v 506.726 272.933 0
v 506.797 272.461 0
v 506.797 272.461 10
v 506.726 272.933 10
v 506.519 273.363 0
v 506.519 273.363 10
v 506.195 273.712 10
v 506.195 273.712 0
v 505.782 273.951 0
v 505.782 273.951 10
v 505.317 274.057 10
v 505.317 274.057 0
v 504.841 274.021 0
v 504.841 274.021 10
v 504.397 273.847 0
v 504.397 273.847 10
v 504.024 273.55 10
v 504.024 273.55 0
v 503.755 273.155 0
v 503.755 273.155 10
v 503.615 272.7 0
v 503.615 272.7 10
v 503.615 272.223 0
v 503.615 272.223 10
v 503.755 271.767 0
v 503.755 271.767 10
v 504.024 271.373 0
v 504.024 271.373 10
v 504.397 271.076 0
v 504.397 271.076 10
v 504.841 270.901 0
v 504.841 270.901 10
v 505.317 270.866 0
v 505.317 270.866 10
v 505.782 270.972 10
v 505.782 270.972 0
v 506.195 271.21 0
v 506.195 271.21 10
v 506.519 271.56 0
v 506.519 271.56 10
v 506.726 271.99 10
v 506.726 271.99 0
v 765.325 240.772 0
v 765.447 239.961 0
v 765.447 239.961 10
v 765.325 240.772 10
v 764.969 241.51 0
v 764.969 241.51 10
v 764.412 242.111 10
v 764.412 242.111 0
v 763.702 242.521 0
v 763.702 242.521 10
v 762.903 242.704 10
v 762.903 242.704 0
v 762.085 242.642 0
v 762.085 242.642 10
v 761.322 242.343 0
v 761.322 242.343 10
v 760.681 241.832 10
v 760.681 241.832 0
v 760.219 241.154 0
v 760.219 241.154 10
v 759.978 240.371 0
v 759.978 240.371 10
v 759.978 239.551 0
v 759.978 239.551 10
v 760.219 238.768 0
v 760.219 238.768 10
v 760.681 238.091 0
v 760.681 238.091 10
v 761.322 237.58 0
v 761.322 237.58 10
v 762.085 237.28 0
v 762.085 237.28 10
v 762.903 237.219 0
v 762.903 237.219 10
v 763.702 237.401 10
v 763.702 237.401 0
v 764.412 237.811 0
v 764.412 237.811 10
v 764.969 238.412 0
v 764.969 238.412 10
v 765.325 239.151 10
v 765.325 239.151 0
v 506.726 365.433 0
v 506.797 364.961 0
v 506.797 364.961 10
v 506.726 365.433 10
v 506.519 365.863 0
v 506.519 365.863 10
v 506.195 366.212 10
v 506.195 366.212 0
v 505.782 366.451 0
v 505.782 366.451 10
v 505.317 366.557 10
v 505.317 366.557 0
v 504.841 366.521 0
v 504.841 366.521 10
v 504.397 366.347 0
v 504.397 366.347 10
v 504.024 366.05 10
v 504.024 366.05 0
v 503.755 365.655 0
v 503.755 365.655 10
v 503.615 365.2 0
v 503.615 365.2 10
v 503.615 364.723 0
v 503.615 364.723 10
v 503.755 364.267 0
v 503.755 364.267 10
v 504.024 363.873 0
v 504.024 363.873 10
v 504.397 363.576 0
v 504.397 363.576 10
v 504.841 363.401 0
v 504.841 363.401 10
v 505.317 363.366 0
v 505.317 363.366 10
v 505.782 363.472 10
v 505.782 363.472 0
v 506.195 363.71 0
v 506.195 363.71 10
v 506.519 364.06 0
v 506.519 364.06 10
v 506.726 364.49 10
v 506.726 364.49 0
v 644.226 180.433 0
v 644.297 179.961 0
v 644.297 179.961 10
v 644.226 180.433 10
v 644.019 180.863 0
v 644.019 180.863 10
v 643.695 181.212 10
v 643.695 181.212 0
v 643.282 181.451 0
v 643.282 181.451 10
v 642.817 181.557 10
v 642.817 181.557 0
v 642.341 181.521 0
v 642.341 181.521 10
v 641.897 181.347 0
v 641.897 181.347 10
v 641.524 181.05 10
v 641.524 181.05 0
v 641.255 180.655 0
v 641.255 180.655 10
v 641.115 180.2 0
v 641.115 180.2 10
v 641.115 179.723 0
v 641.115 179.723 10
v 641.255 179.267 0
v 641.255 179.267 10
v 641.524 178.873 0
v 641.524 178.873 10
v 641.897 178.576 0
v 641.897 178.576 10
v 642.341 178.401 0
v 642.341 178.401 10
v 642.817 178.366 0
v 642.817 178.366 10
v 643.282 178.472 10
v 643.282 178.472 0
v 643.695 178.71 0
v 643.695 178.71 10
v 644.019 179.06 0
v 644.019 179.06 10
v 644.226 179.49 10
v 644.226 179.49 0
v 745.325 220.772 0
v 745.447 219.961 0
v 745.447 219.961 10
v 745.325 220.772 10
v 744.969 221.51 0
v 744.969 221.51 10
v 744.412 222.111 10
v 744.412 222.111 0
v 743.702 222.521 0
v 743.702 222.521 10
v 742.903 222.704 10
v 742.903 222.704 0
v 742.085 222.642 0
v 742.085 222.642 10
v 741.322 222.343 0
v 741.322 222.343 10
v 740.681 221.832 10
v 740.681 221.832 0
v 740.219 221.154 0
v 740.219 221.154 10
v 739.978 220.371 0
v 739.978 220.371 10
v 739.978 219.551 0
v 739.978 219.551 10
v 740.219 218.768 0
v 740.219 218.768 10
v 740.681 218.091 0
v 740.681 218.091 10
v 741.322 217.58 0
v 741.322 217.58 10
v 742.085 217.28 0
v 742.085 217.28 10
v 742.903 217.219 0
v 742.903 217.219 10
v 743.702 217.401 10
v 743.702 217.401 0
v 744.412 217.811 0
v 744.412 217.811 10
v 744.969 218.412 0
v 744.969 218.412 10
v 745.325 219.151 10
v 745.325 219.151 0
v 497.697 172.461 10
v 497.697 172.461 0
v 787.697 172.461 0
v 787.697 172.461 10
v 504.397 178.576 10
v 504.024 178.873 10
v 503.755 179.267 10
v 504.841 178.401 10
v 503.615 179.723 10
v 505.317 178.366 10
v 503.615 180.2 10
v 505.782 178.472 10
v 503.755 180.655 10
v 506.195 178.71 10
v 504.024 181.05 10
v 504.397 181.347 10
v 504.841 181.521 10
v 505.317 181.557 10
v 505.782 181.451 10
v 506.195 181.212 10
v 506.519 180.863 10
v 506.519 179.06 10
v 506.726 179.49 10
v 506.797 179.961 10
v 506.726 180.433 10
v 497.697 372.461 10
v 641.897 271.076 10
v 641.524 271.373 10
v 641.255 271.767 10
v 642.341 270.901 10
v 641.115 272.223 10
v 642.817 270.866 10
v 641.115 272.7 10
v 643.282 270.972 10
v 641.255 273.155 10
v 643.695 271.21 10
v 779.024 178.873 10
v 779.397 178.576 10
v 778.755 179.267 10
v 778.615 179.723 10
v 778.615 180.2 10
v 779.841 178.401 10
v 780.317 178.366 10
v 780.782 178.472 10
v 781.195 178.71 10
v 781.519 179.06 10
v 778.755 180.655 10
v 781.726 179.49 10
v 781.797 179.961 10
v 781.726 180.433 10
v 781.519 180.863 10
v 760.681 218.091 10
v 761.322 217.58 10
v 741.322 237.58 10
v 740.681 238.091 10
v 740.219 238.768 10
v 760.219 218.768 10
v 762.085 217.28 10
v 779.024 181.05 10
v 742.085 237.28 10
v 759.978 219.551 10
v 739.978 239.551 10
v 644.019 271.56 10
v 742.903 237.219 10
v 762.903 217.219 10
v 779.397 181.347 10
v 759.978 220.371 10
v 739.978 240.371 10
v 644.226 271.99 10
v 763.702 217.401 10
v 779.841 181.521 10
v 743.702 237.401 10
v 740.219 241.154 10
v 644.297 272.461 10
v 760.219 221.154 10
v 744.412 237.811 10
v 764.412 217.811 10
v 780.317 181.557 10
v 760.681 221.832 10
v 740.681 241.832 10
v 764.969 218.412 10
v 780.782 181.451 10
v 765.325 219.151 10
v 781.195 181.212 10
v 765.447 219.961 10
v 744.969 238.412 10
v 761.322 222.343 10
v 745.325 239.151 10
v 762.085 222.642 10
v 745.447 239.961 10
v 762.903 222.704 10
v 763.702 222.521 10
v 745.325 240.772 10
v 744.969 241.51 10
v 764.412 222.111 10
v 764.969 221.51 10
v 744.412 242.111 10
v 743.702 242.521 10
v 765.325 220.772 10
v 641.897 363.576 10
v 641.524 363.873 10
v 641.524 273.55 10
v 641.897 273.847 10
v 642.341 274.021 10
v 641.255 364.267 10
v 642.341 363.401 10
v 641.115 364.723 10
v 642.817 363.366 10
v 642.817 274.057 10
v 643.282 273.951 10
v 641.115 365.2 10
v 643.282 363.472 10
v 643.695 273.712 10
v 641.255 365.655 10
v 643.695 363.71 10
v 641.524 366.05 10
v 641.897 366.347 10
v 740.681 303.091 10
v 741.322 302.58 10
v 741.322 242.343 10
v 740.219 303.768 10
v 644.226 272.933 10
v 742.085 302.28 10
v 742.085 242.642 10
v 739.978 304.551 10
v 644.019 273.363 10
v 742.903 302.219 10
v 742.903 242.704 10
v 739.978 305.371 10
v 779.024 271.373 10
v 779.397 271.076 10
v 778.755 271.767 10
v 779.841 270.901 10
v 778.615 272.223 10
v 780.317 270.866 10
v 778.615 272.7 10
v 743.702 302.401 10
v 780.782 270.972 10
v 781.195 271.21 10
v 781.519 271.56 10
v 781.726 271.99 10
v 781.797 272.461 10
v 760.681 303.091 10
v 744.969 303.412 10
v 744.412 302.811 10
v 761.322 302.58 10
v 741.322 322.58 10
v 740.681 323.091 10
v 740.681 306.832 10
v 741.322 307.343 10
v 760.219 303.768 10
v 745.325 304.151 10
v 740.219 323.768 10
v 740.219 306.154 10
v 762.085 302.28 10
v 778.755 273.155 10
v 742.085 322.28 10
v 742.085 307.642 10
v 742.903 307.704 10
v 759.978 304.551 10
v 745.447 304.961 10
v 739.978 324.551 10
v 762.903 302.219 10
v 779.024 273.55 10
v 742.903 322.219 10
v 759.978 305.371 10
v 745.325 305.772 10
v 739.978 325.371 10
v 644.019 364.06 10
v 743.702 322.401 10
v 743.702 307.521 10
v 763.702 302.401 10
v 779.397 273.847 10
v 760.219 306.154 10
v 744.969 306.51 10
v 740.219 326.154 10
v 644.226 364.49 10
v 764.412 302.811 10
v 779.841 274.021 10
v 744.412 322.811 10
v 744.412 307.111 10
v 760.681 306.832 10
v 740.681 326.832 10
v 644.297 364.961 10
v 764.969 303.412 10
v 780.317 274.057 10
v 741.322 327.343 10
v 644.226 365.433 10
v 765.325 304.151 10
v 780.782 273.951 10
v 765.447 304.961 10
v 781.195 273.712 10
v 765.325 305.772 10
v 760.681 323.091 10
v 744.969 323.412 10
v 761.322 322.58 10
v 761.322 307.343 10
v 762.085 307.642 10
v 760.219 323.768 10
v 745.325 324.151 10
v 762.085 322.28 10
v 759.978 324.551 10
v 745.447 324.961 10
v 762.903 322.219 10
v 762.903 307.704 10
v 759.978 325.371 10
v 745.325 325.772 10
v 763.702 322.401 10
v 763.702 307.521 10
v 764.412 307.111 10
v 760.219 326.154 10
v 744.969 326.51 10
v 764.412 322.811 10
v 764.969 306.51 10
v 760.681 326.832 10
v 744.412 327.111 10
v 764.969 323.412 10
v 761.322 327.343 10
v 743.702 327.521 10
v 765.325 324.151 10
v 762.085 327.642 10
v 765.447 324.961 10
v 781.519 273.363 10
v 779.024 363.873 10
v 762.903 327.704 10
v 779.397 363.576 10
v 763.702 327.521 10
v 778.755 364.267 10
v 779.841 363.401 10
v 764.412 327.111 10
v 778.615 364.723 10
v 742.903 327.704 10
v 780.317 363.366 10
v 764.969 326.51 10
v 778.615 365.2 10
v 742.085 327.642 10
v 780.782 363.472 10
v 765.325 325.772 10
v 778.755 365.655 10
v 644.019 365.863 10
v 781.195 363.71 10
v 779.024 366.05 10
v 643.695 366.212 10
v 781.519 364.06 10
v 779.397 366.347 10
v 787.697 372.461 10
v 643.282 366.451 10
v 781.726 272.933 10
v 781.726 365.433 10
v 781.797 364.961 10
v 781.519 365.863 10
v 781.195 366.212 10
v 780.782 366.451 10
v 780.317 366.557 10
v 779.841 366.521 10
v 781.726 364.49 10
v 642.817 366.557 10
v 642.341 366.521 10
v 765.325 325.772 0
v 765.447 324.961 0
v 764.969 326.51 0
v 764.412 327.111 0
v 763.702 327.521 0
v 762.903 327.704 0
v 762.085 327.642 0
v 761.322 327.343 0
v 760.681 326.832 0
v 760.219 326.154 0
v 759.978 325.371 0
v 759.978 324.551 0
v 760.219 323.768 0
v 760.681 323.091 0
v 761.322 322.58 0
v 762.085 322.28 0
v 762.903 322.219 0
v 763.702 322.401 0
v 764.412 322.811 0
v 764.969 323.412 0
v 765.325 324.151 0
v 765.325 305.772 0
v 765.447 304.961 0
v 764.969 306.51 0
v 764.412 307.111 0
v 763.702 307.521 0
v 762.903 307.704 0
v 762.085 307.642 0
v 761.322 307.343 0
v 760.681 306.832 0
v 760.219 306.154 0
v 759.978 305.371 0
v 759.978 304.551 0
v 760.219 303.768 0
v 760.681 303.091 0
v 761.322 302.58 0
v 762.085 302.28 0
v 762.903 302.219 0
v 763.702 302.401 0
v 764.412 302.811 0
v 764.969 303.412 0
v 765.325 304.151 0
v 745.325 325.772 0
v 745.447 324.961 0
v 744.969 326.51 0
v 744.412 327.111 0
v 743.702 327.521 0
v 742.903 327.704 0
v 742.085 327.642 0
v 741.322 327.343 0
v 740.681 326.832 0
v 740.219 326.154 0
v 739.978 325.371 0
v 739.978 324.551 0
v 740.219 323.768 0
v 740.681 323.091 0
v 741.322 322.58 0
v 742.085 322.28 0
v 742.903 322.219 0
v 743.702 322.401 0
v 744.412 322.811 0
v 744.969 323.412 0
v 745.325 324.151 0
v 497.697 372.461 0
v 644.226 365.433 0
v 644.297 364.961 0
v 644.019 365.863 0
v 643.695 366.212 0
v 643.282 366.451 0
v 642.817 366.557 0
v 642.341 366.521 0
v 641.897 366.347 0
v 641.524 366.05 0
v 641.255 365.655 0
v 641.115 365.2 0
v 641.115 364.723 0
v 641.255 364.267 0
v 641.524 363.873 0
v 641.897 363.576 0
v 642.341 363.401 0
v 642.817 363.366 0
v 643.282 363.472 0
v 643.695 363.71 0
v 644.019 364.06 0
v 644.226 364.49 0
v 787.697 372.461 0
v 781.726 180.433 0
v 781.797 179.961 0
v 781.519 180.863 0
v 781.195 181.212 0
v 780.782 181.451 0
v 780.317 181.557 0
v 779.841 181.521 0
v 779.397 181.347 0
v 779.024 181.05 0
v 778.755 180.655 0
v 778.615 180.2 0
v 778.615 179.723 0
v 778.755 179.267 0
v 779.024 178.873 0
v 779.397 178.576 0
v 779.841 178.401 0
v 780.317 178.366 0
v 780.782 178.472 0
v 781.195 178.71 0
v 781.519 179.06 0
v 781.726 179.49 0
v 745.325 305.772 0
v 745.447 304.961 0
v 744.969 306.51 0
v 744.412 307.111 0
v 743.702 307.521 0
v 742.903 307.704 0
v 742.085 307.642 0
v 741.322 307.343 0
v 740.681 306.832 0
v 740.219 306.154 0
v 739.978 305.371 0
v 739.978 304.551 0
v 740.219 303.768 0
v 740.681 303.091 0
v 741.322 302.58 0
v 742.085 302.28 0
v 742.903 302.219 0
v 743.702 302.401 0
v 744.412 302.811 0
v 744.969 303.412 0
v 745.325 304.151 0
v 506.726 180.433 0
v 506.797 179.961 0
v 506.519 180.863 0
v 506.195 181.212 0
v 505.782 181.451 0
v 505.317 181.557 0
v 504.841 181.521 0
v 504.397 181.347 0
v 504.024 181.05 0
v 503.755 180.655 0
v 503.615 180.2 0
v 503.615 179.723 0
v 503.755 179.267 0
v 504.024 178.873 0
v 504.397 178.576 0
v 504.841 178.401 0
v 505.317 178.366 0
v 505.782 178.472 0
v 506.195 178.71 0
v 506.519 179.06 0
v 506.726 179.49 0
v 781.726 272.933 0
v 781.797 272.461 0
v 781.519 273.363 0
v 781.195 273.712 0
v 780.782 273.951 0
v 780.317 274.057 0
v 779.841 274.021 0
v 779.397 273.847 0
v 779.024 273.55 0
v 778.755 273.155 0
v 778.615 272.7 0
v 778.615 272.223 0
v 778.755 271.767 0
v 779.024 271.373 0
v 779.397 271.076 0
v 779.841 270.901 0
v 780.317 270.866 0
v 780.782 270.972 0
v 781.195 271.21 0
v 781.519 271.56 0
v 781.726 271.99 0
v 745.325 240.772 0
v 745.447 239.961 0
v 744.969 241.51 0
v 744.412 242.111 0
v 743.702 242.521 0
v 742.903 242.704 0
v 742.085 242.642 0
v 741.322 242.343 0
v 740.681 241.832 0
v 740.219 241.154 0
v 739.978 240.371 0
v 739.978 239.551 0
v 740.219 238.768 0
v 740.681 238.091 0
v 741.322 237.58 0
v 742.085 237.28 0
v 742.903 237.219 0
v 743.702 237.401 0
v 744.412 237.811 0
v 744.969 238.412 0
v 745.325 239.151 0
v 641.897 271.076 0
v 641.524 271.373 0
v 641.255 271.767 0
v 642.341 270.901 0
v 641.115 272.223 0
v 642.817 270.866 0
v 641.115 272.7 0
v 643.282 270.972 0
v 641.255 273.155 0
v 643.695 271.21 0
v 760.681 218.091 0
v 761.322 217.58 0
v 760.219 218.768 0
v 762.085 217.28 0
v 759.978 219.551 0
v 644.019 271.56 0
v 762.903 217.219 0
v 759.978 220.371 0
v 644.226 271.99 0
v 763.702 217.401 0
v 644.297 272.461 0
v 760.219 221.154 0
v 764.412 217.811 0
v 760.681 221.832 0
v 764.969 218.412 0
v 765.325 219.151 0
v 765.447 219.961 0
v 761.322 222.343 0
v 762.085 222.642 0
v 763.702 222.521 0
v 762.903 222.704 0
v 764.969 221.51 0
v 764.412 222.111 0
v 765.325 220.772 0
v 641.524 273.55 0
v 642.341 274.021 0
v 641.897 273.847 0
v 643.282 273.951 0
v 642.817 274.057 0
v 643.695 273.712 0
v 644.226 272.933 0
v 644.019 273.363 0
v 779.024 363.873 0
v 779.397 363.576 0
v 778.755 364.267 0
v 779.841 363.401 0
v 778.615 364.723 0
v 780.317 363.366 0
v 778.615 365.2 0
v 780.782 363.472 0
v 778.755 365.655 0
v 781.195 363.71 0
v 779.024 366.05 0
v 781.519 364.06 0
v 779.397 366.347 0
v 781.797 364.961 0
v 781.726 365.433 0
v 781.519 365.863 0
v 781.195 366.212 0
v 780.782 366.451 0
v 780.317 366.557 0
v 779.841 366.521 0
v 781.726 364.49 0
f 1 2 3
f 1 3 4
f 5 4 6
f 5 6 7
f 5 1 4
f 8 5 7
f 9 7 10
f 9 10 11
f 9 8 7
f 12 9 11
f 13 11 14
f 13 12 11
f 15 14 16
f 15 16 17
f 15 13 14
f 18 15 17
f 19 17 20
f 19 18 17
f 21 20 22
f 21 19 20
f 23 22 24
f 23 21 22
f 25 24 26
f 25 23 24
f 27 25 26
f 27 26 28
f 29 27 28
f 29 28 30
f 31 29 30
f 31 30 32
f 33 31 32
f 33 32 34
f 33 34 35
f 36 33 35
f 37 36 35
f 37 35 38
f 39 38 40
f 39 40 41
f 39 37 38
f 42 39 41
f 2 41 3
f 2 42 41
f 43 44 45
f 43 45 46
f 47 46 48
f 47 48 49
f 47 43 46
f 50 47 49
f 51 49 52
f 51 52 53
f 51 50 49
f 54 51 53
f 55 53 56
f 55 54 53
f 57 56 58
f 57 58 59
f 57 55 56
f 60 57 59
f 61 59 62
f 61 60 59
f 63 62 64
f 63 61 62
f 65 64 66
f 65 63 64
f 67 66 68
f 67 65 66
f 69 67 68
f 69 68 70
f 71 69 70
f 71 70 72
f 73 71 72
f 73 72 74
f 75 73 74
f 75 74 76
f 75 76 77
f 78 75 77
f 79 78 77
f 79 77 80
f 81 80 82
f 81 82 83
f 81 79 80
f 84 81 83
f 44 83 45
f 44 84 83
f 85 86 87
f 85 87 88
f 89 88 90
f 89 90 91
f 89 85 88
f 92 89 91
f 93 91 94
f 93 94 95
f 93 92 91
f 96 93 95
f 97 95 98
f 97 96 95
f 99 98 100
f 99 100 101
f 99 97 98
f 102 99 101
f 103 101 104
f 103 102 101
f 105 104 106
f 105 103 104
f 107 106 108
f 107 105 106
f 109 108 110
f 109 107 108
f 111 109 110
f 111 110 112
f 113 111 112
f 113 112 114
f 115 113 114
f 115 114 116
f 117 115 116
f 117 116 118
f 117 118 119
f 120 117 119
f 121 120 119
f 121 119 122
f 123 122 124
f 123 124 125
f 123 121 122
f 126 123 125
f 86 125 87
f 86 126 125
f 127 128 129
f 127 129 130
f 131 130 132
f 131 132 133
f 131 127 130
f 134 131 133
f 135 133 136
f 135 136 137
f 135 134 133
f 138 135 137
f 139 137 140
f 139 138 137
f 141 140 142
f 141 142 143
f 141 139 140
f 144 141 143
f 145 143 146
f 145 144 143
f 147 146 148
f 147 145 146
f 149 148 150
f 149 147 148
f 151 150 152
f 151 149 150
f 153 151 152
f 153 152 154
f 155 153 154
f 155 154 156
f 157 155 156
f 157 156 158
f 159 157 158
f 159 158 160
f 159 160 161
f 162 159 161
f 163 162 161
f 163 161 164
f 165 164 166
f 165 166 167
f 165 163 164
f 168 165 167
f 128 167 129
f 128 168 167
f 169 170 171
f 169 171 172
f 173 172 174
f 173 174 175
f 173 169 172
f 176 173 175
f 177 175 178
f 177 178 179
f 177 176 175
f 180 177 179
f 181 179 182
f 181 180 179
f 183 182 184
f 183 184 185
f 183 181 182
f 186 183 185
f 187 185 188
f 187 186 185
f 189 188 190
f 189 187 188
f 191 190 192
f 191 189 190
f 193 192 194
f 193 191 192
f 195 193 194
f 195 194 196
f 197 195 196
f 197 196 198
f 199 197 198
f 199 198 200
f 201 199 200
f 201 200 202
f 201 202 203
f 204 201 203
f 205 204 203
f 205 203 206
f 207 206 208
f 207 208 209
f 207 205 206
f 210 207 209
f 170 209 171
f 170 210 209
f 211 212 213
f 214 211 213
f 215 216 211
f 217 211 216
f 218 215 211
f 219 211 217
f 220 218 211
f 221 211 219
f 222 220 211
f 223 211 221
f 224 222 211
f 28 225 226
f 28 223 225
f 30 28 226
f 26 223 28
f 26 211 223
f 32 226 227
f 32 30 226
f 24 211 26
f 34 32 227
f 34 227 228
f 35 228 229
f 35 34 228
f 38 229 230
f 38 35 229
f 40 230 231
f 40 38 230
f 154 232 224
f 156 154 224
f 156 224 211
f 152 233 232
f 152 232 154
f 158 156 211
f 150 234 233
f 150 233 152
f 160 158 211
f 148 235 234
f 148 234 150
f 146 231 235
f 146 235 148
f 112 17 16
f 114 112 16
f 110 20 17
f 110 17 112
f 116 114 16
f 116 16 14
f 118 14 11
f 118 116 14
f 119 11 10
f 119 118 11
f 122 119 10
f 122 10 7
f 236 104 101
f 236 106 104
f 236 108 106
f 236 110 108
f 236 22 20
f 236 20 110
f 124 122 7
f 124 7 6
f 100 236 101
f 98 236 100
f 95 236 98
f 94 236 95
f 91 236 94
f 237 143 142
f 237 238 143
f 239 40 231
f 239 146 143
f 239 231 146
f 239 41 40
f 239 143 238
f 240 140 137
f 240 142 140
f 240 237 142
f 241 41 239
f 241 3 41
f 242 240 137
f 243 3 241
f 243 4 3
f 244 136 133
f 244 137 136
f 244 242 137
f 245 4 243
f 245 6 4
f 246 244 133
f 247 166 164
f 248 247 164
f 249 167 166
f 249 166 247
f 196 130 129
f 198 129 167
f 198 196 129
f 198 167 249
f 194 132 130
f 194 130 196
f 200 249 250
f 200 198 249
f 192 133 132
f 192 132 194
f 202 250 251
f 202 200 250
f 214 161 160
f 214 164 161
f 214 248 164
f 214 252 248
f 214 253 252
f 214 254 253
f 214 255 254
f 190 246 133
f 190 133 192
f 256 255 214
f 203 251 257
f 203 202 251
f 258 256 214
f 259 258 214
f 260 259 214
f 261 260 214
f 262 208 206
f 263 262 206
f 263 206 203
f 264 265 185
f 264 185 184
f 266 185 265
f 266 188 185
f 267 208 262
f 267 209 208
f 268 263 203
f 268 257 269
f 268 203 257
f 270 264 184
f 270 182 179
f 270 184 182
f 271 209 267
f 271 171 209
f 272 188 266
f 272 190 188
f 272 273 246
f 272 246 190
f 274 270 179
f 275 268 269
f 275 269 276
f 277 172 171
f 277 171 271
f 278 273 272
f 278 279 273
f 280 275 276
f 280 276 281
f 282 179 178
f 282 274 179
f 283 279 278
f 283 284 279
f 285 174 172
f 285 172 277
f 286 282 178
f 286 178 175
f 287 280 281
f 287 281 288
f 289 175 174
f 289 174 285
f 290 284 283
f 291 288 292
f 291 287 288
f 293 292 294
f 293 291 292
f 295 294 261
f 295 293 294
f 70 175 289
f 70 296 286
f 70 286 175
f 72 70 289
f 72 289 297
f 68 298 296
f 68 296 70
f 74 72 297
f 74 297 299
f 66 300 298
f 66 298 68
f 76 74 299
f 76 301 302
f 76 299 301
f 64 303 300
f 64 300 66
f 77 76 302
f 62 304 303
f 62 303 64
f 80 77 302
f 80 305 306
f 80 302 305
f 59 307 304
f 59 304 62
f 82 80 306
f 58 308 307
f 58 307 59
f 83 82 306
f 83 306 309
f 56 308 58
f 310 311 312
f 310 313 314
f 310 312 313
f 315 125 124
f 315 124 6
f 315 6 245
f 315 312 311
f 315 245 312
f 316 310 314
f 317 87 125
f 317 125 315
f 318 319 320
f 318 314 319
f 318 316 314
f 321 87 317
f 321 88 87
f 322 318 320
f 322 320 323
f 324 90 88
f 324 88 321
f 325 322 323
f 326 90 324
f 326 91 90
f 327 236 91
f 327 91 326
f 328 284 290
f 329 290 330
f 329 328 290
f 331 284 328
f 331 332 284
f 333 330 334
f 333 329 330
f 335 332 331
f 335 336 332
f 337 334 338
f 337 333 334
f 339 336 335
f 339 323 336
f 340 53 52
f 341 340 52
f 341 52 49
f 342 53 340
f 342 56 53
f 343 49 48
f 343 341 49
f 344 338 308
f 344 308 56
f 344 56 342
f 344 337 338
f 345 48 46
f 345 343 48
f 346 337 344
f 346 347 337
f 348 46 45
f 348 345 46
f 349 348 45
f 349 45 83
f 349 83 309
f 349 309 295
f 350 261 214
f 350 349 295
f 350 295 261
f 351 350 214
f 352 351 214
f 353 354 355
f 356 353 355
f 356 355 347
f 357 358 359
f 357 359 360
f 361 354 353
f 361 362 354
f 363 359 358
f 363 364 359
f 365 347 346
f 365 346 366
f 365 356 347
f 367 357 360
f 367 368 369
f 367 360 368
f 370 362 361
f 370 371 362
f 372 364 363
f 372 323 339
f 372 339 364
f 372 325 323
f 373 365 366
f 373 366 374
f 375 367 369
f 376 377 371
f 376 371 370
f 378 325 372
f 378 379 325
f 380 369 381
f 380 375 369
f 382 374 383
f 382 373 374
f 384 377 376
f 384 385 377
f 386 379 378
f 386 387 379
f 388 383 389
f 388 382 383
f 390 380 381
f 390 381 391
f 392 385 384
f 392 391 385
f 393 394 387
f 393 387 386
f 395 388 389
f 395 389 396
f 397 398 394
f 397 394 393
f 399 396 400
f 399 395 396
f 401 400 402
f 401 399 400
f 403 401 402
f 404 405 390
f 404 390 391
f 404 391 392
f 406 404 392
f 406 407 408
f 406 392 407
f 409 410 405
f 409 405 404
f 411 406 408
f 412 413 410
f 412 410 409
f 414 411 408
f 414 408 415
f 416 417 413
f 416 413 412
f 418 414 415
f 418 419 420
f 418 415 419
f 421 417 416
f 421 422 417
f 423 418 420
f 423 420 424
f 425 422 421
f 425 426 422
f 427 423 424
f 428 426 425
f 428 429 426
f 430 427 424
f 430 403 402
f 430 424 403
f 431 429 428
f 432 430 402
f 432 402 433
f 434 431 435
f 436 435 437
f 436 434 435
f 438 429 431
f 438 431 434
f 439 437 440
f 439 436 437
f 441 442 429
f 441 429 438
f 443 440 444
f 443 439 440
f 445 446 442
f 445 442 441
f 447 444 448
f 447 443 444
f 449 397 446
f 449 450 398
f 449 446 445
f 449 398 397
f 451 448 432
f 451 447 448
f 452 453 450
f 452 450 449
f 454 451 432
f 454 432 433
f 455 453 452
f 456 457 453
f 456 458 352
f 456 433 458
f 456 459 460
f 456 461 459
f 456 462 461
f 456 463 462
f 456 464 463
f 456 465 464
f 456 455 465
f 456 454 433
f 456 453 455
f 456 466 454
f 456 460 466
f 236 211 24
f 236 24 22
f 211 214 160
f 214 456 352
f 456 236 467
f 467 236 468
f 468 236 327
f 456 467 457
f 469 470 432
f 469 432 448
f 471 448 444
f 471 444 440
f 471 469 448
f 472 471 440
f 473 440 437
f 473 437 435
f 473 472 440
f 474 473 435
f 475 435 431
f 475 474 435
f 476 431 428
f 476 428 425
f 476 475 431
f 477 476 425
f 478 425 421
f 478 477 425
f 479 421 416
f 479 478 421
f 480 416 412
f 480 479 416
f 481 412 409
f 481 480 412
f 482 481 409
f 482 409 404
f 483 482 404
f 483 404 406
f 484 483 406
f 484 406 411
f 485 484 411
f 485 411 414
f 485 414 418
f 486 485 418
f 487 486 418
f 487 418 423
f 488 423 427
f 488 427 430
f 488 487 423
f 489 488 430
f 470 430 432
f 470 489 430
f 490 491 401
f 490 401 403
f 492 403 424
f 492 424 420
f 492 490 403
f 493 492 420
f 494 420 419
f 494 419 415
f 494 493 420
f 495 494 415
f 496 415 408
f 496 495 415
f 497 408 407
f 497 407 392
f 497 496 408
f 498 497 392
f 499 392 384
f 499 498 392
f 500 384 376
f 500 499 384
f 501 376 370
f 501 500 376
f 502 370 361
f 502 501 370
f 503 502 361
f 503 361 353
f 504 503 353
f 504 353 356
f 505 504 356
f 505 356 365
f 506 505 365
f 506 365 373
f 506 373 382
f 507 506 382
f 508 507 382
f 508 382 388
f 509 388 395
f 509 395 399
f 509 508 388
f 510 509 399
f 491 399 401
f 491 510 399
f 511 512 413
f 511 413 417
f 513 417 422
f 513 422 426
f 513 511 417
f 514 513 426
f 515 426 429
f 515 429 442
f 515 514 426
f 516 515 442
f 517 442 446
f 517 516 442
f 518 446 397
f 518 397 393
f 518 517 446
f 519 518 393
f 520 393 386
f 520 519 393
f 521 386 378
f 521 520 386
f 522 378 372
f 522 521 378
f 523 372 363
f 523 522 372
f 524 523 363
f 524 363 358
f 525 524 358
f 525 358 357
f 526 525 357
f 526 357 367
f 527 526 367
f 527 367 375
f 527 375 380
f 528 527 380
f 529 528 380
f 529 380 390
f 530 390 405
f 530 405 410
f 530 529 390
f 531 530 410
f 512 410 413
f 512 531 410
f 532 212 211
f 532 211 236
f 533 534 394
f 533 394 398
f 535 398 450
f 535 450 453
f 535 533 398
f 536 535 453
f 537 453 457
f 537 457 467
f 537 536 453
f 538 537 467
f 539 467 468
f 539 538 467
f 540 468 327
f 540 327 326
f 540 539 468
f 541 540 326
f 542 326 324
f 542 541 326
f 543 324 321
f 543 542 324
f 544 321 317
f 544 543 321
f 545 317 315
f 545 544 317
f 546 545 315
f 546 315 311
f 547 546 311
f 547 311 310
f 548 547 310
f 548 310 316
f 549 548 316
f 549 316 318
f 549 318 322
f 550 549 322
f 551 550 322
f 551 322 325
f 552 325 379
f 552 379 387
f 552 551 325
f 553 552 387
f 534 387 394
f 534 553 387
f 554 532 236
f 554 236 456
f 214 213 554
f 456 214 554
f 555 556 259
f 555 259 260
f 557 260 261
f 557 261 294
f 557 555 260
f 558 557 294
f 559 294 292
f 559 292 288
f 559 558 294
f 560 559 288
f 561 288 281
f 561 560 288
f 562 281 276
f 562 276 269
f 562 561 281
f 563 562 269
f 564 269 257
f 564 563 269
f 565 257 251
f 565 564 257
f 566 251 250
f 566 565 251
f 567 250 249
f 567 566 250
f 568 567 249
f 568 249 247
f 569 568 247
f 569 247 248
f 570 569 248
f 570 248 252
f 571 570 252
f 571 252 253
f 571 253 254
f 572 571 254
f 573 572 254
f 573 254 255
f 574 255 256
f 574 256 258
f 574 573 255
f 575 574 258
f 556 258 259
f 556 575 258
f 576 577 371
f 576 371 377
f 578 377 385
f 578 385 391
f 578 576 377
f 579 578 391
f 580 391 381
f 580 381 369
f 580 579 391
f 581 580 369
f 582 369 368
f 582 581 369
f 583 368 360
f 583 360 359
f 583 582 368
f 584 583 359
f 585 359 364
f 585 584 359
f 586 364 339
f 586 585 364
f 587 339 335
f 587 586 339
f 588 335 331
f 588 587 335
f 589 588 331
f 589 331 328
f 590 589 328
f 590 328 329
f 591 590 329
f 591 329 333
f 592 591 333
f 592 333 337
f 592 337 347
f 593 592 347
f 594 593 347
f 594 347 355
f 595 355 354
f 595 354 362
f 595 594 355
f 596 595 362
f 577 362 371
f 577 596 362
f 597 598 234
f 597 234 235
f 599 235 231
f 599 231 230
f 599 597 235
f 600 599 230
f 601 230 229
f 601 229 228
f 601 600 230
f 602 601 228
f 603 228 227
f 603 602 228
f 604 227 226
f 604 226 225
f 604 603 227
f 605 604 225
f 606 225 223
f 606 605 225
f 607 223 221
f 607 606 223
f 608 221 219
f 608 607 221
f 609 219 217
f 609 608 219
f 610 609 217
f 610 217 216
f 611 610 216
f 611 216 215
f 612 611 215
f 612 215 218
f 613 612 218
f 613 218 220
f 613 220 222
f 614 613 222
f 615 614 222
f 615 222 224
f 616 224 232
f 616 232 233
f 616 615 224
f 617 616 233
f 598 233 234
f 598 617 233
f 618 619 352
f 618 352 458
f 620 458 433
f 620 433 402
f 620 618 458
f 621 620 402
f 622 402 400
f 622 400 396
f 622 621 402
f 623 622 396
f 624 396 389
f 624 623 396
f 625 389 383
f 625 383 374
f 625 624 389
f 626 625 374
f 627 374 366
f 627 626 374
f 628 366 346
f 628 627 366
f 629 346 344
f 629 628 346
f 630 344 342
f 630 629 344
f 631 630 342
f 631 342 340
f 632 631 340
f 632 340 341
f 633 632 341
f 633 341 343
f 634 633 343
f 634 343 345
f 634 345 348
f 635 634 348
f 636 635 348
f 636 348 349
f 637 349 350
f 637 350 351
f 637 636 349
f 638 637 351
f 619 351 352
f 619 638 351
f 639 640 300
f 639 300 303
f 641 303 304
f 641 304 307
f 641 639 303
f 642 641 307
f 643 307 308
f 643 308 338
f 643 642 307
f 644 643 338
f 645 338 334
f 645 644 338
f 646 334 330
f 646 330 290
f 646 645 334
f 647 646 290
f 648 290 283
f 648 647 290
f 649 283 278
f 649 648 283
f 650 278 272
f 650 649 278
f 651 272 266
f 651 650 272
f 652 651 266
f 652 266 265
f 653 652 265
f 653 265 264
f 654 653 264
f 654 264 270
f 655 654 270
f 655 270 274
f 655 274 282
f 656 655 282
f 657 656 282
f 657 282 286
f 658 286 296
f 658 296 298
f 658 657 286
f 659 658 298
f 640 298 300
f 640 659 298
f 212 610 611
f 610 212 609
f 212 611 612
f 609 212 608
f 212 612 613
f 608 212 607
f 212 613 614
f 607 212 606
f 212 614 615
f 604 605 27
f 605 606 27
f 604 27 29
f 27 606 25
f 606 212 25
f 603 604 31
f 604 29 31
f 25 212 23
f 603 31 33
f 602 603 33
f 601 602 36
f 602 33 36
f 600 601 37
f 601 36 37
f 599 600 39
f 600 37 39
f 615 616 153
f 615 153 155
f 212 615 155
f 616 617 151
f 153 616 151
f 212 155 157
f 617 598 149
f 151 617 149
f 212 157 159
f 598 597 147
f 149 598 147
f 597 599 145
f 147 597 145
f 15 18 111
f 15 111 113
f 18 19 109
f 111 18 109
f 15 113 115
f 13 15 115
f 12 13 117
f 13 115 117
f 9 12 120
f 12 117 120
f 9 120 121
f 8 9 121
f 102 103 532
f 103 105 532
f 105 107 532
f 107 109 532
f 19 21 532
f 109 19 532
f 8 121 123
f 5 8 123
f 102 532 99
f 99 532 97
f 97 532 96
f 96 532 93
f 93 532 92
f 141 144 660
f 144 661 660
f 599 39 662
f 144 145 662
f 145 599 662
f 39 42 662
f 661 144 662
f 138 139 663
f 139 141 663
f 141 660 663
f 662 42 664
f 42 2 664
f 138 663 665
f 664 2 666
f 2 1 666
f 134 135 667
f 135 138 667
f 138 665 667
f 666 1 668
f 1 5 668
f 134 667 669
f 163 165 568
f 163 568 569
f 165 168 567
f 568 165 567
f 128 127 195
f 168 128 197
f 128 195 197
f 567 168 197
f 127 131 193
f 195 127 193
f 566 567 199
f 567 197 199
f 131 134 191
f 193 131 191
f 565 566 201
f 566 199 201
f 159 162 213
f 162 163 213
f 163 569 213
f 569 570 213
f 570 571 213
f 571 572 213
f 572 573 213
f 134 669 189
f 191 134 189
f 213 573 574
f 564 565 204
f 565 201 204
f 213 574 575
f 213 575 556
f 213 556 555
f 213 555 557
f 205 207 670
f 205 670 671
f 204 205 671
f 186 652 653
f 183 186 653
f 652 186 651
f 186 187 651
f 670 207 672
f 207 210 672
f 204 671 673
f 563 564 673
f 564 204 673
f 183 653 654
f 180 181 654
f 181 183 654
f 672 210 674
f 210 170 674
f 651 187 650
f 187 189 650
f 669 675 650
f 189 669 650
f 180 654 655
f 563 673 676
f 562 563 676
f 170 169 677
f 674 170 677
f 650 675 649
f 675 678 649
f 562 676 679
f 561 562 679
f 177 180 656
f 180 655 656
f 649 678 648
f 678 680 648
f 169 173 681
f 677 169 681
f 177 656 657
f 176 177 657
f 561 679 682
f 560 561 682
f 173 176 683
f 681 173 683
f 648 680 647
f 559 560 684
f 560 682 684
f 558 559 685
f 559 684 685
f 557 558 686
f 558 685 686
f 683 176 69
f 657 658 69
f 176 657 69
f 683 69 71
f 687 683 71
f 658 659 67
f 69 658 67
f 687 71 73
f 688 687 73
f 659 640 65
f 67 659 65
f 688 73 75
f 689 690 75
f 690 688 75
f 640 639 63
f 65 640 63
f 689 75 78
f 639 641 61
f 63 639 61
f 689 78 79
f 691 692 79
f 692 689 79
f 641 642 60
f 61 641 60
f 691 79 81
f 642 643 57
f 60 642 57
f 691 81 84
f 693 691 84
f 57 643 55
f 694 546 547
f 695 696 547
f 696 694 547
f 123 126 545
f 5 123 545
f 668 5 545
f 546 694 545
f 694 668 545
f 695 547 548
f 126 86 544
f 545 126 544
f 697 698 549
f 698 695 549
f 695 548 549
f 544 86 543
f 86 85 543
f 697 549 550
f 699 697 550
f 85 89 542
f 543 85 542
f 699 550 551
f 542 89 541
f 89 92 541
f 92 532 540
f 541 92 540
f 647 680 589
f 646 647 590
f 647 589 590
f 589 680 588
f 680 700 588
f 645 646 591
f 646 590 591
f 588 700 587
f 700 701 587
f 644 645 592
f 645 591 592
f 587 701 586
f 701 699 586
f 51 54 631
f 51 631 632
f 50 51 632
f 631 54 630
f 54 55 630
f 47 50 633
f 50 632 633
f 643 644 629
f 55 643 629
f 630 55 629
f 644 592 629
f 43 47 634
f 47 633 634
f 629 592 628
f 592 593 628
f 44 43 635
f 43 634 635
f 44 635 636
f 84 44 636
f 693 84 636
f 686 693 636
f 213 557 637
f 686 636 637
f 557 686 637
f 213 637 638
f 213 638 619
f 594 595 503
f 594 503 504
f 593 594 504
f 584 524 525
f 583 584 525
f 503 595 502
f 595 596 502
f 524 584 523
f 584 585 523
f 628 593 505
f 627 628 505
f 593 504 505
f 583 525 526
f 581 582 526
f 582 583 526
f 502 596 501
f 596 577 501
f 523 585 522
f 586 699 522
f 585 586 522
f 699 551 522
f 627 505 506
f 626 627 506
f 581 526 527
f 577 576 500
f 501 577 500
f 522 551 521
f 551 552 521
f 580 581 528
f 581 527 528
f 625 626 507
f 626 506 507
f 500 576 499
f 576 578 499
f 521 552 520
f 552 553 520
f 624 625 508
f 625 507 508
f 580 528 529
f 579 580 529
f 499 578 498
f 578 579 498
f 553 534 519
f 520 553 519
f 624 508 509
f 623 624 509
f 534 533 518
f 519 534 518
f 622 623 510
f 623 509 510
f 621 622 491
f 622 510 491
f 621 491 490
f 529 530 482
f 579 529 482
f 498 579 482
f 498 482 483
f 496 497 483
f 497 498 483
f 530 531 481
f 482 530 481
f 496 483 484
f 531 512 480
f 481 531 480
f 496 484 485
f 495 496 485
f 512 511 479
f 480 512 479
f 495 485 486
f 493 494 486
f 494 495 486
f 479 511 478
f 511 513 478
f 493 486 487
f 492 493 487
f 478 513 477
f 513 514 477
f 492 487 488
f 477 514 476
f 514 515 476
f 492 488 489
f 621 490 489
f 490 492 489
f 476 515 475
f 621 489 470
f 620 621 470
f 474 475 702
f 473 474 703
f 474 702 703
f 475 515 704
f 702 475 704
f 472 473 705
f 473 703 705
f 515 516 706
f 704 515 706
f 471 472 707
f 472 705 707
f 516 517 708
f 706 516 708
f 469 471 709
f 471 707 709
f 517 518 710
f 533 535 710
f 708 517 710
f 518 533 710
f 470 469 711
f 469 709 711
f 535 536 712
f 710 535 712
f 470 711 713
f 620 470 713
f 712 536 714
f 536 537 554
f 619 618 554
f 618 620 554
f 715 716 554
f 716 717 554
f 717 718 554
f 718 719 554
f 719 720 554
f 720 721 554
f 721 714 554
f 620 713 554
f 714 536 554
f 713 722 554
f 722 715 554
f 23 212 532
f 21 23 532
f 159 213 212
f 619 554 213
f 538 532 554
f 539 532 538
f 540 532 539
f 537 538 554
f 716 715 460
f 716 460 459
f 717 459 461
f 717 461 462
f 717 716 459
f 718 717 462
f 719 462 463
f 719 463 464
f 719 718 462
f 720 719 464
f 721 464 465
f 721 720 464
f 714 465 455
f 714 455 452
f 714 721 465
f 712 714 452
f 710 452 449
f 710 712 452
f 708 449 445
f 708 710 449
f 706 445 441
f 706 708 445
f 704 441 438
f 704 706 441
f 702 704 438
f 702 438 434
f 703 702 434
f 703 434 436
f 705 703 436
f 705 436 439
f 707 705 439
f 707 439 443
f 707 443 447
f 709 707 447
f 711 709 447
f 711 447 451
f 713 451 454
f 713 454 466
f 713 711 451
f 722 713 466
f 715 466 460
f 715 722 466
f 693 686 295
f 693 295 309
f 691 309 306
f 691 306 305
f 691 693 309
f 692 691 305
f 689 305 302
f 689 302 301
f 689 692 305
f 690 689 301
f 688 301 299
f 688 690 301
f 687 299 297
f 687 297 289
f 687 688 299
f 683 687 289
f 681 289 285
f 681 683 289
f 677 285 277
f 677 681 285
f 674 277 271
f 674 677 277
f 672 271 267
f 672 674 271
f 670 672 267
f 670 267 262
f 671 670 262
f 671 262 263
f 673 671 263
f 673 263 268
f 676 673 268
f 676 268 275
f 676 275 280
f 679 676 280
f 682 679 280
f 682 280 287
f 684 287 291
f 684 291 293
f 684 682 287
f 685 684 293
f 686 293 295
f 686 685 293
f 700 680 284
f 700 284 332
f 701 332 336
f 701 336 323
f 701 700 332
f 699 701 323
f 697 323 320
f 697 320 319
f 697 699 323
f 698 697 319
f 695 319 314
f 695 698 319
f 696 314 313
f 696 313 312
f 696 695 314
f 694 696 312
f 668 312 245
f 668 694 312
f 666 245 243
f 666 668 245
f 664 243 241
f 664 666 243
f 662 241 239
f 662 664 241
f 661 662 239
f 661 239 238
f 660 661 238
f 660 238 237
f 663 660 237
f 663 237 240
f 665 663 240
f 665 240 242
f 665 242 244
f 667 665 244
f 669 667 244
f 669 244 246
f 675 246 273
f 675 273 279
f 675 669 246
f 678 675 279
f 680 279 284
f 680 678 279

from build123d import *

# Parameters (mm, degrees)
MODEL_W         = 290
MODEL_H         = 200
MODEL_R         = 2.75
MODEL_R_2       = 1.6
EXTRUDE_1_DEPTH = 10


with BuildPart() as part:
    # Model → 凸台-拉伸1 (new body)
    with BuildSketch(Plane.XY):
        with Locations((642.697027816, 272.461256116)):
            Rectangle(MODEL_W, MODEL_H)
        with Locations((742.697027816, 219.961256116)):
            Circle(MODEL_R, mode=Mode.SUBTRACT)
        with Locations((762.697027816, 219.961256116)):
            Circle(MODEL_R, mode=Mode.SUBTRACT)
        with Locations((742.697027816, 239.961256116)):
            Circle(MODEL_R, mode=Mode.SUBTRACT)
        with Locations((762.697027816, 239.961256116)):
            Circle(MODEL_R, mode=Mode.SUBTRACT)
        with Locations((742.697027816, 324.961256116)):
            Circle(MODEL_R, mode=Mode.SUBTRACT)
        with Locations((762.697027816, 324.961256116)):
            Circle(MODEL_R, mode=Mode.SUBTRACT)
        with Locations((742.697027816, 304.961256116)):
            Circle(MODEL_R, mode=Mode.SUBTRACT)
        with Locations((762.697027816, 304.961256116)):
            Circle(MODEL_R, mode=Mode.SUBTRACT)
        with Locations((642.697027816, 364.961256116)):
            Circle(MODEL_R_2, mode=Mode.SUBTRACT)
        with Locations((642.697027816, 179.961256116)):
            Circle(MODEL_R_2, mode=Mode.SUBTRACT)
        with Locations((505.197027816, 272.461256116)):
            Circle(MODEL_R_2, mode=Mode.SUBTRACT)
        with Locations((780.197027816, 272.461256116)):
            Circle(MODEL_R_2, mode=Mode.SUBTRACT)
        with Locations((642.697027816, 272.461256116)):
            Circle(MODEL_R_2, mode=Mode.SUBTRACT)
        with Locations((780.197027816, 364.961256116)):
            Circle(MODEL_R_2, mode=Mode.SUBTRACT)
        with Locations((505.197027816, 364.961256116)):
            Circle(MODEL_R_2, mode=Mode.SUBTRACT)
        with Locations((780.197027816, 179.961256116)):
            Circle(MODEL_R_2, mode=Mode.SUBTRACT)
        with Locations((505.197027816, 179.961256116)):
            Circle(MODEL_R_2, mode=Mode.SUBTRACT)
    extrude(amount=EXTRUDE_1_DEPTH)


solid = part.part
